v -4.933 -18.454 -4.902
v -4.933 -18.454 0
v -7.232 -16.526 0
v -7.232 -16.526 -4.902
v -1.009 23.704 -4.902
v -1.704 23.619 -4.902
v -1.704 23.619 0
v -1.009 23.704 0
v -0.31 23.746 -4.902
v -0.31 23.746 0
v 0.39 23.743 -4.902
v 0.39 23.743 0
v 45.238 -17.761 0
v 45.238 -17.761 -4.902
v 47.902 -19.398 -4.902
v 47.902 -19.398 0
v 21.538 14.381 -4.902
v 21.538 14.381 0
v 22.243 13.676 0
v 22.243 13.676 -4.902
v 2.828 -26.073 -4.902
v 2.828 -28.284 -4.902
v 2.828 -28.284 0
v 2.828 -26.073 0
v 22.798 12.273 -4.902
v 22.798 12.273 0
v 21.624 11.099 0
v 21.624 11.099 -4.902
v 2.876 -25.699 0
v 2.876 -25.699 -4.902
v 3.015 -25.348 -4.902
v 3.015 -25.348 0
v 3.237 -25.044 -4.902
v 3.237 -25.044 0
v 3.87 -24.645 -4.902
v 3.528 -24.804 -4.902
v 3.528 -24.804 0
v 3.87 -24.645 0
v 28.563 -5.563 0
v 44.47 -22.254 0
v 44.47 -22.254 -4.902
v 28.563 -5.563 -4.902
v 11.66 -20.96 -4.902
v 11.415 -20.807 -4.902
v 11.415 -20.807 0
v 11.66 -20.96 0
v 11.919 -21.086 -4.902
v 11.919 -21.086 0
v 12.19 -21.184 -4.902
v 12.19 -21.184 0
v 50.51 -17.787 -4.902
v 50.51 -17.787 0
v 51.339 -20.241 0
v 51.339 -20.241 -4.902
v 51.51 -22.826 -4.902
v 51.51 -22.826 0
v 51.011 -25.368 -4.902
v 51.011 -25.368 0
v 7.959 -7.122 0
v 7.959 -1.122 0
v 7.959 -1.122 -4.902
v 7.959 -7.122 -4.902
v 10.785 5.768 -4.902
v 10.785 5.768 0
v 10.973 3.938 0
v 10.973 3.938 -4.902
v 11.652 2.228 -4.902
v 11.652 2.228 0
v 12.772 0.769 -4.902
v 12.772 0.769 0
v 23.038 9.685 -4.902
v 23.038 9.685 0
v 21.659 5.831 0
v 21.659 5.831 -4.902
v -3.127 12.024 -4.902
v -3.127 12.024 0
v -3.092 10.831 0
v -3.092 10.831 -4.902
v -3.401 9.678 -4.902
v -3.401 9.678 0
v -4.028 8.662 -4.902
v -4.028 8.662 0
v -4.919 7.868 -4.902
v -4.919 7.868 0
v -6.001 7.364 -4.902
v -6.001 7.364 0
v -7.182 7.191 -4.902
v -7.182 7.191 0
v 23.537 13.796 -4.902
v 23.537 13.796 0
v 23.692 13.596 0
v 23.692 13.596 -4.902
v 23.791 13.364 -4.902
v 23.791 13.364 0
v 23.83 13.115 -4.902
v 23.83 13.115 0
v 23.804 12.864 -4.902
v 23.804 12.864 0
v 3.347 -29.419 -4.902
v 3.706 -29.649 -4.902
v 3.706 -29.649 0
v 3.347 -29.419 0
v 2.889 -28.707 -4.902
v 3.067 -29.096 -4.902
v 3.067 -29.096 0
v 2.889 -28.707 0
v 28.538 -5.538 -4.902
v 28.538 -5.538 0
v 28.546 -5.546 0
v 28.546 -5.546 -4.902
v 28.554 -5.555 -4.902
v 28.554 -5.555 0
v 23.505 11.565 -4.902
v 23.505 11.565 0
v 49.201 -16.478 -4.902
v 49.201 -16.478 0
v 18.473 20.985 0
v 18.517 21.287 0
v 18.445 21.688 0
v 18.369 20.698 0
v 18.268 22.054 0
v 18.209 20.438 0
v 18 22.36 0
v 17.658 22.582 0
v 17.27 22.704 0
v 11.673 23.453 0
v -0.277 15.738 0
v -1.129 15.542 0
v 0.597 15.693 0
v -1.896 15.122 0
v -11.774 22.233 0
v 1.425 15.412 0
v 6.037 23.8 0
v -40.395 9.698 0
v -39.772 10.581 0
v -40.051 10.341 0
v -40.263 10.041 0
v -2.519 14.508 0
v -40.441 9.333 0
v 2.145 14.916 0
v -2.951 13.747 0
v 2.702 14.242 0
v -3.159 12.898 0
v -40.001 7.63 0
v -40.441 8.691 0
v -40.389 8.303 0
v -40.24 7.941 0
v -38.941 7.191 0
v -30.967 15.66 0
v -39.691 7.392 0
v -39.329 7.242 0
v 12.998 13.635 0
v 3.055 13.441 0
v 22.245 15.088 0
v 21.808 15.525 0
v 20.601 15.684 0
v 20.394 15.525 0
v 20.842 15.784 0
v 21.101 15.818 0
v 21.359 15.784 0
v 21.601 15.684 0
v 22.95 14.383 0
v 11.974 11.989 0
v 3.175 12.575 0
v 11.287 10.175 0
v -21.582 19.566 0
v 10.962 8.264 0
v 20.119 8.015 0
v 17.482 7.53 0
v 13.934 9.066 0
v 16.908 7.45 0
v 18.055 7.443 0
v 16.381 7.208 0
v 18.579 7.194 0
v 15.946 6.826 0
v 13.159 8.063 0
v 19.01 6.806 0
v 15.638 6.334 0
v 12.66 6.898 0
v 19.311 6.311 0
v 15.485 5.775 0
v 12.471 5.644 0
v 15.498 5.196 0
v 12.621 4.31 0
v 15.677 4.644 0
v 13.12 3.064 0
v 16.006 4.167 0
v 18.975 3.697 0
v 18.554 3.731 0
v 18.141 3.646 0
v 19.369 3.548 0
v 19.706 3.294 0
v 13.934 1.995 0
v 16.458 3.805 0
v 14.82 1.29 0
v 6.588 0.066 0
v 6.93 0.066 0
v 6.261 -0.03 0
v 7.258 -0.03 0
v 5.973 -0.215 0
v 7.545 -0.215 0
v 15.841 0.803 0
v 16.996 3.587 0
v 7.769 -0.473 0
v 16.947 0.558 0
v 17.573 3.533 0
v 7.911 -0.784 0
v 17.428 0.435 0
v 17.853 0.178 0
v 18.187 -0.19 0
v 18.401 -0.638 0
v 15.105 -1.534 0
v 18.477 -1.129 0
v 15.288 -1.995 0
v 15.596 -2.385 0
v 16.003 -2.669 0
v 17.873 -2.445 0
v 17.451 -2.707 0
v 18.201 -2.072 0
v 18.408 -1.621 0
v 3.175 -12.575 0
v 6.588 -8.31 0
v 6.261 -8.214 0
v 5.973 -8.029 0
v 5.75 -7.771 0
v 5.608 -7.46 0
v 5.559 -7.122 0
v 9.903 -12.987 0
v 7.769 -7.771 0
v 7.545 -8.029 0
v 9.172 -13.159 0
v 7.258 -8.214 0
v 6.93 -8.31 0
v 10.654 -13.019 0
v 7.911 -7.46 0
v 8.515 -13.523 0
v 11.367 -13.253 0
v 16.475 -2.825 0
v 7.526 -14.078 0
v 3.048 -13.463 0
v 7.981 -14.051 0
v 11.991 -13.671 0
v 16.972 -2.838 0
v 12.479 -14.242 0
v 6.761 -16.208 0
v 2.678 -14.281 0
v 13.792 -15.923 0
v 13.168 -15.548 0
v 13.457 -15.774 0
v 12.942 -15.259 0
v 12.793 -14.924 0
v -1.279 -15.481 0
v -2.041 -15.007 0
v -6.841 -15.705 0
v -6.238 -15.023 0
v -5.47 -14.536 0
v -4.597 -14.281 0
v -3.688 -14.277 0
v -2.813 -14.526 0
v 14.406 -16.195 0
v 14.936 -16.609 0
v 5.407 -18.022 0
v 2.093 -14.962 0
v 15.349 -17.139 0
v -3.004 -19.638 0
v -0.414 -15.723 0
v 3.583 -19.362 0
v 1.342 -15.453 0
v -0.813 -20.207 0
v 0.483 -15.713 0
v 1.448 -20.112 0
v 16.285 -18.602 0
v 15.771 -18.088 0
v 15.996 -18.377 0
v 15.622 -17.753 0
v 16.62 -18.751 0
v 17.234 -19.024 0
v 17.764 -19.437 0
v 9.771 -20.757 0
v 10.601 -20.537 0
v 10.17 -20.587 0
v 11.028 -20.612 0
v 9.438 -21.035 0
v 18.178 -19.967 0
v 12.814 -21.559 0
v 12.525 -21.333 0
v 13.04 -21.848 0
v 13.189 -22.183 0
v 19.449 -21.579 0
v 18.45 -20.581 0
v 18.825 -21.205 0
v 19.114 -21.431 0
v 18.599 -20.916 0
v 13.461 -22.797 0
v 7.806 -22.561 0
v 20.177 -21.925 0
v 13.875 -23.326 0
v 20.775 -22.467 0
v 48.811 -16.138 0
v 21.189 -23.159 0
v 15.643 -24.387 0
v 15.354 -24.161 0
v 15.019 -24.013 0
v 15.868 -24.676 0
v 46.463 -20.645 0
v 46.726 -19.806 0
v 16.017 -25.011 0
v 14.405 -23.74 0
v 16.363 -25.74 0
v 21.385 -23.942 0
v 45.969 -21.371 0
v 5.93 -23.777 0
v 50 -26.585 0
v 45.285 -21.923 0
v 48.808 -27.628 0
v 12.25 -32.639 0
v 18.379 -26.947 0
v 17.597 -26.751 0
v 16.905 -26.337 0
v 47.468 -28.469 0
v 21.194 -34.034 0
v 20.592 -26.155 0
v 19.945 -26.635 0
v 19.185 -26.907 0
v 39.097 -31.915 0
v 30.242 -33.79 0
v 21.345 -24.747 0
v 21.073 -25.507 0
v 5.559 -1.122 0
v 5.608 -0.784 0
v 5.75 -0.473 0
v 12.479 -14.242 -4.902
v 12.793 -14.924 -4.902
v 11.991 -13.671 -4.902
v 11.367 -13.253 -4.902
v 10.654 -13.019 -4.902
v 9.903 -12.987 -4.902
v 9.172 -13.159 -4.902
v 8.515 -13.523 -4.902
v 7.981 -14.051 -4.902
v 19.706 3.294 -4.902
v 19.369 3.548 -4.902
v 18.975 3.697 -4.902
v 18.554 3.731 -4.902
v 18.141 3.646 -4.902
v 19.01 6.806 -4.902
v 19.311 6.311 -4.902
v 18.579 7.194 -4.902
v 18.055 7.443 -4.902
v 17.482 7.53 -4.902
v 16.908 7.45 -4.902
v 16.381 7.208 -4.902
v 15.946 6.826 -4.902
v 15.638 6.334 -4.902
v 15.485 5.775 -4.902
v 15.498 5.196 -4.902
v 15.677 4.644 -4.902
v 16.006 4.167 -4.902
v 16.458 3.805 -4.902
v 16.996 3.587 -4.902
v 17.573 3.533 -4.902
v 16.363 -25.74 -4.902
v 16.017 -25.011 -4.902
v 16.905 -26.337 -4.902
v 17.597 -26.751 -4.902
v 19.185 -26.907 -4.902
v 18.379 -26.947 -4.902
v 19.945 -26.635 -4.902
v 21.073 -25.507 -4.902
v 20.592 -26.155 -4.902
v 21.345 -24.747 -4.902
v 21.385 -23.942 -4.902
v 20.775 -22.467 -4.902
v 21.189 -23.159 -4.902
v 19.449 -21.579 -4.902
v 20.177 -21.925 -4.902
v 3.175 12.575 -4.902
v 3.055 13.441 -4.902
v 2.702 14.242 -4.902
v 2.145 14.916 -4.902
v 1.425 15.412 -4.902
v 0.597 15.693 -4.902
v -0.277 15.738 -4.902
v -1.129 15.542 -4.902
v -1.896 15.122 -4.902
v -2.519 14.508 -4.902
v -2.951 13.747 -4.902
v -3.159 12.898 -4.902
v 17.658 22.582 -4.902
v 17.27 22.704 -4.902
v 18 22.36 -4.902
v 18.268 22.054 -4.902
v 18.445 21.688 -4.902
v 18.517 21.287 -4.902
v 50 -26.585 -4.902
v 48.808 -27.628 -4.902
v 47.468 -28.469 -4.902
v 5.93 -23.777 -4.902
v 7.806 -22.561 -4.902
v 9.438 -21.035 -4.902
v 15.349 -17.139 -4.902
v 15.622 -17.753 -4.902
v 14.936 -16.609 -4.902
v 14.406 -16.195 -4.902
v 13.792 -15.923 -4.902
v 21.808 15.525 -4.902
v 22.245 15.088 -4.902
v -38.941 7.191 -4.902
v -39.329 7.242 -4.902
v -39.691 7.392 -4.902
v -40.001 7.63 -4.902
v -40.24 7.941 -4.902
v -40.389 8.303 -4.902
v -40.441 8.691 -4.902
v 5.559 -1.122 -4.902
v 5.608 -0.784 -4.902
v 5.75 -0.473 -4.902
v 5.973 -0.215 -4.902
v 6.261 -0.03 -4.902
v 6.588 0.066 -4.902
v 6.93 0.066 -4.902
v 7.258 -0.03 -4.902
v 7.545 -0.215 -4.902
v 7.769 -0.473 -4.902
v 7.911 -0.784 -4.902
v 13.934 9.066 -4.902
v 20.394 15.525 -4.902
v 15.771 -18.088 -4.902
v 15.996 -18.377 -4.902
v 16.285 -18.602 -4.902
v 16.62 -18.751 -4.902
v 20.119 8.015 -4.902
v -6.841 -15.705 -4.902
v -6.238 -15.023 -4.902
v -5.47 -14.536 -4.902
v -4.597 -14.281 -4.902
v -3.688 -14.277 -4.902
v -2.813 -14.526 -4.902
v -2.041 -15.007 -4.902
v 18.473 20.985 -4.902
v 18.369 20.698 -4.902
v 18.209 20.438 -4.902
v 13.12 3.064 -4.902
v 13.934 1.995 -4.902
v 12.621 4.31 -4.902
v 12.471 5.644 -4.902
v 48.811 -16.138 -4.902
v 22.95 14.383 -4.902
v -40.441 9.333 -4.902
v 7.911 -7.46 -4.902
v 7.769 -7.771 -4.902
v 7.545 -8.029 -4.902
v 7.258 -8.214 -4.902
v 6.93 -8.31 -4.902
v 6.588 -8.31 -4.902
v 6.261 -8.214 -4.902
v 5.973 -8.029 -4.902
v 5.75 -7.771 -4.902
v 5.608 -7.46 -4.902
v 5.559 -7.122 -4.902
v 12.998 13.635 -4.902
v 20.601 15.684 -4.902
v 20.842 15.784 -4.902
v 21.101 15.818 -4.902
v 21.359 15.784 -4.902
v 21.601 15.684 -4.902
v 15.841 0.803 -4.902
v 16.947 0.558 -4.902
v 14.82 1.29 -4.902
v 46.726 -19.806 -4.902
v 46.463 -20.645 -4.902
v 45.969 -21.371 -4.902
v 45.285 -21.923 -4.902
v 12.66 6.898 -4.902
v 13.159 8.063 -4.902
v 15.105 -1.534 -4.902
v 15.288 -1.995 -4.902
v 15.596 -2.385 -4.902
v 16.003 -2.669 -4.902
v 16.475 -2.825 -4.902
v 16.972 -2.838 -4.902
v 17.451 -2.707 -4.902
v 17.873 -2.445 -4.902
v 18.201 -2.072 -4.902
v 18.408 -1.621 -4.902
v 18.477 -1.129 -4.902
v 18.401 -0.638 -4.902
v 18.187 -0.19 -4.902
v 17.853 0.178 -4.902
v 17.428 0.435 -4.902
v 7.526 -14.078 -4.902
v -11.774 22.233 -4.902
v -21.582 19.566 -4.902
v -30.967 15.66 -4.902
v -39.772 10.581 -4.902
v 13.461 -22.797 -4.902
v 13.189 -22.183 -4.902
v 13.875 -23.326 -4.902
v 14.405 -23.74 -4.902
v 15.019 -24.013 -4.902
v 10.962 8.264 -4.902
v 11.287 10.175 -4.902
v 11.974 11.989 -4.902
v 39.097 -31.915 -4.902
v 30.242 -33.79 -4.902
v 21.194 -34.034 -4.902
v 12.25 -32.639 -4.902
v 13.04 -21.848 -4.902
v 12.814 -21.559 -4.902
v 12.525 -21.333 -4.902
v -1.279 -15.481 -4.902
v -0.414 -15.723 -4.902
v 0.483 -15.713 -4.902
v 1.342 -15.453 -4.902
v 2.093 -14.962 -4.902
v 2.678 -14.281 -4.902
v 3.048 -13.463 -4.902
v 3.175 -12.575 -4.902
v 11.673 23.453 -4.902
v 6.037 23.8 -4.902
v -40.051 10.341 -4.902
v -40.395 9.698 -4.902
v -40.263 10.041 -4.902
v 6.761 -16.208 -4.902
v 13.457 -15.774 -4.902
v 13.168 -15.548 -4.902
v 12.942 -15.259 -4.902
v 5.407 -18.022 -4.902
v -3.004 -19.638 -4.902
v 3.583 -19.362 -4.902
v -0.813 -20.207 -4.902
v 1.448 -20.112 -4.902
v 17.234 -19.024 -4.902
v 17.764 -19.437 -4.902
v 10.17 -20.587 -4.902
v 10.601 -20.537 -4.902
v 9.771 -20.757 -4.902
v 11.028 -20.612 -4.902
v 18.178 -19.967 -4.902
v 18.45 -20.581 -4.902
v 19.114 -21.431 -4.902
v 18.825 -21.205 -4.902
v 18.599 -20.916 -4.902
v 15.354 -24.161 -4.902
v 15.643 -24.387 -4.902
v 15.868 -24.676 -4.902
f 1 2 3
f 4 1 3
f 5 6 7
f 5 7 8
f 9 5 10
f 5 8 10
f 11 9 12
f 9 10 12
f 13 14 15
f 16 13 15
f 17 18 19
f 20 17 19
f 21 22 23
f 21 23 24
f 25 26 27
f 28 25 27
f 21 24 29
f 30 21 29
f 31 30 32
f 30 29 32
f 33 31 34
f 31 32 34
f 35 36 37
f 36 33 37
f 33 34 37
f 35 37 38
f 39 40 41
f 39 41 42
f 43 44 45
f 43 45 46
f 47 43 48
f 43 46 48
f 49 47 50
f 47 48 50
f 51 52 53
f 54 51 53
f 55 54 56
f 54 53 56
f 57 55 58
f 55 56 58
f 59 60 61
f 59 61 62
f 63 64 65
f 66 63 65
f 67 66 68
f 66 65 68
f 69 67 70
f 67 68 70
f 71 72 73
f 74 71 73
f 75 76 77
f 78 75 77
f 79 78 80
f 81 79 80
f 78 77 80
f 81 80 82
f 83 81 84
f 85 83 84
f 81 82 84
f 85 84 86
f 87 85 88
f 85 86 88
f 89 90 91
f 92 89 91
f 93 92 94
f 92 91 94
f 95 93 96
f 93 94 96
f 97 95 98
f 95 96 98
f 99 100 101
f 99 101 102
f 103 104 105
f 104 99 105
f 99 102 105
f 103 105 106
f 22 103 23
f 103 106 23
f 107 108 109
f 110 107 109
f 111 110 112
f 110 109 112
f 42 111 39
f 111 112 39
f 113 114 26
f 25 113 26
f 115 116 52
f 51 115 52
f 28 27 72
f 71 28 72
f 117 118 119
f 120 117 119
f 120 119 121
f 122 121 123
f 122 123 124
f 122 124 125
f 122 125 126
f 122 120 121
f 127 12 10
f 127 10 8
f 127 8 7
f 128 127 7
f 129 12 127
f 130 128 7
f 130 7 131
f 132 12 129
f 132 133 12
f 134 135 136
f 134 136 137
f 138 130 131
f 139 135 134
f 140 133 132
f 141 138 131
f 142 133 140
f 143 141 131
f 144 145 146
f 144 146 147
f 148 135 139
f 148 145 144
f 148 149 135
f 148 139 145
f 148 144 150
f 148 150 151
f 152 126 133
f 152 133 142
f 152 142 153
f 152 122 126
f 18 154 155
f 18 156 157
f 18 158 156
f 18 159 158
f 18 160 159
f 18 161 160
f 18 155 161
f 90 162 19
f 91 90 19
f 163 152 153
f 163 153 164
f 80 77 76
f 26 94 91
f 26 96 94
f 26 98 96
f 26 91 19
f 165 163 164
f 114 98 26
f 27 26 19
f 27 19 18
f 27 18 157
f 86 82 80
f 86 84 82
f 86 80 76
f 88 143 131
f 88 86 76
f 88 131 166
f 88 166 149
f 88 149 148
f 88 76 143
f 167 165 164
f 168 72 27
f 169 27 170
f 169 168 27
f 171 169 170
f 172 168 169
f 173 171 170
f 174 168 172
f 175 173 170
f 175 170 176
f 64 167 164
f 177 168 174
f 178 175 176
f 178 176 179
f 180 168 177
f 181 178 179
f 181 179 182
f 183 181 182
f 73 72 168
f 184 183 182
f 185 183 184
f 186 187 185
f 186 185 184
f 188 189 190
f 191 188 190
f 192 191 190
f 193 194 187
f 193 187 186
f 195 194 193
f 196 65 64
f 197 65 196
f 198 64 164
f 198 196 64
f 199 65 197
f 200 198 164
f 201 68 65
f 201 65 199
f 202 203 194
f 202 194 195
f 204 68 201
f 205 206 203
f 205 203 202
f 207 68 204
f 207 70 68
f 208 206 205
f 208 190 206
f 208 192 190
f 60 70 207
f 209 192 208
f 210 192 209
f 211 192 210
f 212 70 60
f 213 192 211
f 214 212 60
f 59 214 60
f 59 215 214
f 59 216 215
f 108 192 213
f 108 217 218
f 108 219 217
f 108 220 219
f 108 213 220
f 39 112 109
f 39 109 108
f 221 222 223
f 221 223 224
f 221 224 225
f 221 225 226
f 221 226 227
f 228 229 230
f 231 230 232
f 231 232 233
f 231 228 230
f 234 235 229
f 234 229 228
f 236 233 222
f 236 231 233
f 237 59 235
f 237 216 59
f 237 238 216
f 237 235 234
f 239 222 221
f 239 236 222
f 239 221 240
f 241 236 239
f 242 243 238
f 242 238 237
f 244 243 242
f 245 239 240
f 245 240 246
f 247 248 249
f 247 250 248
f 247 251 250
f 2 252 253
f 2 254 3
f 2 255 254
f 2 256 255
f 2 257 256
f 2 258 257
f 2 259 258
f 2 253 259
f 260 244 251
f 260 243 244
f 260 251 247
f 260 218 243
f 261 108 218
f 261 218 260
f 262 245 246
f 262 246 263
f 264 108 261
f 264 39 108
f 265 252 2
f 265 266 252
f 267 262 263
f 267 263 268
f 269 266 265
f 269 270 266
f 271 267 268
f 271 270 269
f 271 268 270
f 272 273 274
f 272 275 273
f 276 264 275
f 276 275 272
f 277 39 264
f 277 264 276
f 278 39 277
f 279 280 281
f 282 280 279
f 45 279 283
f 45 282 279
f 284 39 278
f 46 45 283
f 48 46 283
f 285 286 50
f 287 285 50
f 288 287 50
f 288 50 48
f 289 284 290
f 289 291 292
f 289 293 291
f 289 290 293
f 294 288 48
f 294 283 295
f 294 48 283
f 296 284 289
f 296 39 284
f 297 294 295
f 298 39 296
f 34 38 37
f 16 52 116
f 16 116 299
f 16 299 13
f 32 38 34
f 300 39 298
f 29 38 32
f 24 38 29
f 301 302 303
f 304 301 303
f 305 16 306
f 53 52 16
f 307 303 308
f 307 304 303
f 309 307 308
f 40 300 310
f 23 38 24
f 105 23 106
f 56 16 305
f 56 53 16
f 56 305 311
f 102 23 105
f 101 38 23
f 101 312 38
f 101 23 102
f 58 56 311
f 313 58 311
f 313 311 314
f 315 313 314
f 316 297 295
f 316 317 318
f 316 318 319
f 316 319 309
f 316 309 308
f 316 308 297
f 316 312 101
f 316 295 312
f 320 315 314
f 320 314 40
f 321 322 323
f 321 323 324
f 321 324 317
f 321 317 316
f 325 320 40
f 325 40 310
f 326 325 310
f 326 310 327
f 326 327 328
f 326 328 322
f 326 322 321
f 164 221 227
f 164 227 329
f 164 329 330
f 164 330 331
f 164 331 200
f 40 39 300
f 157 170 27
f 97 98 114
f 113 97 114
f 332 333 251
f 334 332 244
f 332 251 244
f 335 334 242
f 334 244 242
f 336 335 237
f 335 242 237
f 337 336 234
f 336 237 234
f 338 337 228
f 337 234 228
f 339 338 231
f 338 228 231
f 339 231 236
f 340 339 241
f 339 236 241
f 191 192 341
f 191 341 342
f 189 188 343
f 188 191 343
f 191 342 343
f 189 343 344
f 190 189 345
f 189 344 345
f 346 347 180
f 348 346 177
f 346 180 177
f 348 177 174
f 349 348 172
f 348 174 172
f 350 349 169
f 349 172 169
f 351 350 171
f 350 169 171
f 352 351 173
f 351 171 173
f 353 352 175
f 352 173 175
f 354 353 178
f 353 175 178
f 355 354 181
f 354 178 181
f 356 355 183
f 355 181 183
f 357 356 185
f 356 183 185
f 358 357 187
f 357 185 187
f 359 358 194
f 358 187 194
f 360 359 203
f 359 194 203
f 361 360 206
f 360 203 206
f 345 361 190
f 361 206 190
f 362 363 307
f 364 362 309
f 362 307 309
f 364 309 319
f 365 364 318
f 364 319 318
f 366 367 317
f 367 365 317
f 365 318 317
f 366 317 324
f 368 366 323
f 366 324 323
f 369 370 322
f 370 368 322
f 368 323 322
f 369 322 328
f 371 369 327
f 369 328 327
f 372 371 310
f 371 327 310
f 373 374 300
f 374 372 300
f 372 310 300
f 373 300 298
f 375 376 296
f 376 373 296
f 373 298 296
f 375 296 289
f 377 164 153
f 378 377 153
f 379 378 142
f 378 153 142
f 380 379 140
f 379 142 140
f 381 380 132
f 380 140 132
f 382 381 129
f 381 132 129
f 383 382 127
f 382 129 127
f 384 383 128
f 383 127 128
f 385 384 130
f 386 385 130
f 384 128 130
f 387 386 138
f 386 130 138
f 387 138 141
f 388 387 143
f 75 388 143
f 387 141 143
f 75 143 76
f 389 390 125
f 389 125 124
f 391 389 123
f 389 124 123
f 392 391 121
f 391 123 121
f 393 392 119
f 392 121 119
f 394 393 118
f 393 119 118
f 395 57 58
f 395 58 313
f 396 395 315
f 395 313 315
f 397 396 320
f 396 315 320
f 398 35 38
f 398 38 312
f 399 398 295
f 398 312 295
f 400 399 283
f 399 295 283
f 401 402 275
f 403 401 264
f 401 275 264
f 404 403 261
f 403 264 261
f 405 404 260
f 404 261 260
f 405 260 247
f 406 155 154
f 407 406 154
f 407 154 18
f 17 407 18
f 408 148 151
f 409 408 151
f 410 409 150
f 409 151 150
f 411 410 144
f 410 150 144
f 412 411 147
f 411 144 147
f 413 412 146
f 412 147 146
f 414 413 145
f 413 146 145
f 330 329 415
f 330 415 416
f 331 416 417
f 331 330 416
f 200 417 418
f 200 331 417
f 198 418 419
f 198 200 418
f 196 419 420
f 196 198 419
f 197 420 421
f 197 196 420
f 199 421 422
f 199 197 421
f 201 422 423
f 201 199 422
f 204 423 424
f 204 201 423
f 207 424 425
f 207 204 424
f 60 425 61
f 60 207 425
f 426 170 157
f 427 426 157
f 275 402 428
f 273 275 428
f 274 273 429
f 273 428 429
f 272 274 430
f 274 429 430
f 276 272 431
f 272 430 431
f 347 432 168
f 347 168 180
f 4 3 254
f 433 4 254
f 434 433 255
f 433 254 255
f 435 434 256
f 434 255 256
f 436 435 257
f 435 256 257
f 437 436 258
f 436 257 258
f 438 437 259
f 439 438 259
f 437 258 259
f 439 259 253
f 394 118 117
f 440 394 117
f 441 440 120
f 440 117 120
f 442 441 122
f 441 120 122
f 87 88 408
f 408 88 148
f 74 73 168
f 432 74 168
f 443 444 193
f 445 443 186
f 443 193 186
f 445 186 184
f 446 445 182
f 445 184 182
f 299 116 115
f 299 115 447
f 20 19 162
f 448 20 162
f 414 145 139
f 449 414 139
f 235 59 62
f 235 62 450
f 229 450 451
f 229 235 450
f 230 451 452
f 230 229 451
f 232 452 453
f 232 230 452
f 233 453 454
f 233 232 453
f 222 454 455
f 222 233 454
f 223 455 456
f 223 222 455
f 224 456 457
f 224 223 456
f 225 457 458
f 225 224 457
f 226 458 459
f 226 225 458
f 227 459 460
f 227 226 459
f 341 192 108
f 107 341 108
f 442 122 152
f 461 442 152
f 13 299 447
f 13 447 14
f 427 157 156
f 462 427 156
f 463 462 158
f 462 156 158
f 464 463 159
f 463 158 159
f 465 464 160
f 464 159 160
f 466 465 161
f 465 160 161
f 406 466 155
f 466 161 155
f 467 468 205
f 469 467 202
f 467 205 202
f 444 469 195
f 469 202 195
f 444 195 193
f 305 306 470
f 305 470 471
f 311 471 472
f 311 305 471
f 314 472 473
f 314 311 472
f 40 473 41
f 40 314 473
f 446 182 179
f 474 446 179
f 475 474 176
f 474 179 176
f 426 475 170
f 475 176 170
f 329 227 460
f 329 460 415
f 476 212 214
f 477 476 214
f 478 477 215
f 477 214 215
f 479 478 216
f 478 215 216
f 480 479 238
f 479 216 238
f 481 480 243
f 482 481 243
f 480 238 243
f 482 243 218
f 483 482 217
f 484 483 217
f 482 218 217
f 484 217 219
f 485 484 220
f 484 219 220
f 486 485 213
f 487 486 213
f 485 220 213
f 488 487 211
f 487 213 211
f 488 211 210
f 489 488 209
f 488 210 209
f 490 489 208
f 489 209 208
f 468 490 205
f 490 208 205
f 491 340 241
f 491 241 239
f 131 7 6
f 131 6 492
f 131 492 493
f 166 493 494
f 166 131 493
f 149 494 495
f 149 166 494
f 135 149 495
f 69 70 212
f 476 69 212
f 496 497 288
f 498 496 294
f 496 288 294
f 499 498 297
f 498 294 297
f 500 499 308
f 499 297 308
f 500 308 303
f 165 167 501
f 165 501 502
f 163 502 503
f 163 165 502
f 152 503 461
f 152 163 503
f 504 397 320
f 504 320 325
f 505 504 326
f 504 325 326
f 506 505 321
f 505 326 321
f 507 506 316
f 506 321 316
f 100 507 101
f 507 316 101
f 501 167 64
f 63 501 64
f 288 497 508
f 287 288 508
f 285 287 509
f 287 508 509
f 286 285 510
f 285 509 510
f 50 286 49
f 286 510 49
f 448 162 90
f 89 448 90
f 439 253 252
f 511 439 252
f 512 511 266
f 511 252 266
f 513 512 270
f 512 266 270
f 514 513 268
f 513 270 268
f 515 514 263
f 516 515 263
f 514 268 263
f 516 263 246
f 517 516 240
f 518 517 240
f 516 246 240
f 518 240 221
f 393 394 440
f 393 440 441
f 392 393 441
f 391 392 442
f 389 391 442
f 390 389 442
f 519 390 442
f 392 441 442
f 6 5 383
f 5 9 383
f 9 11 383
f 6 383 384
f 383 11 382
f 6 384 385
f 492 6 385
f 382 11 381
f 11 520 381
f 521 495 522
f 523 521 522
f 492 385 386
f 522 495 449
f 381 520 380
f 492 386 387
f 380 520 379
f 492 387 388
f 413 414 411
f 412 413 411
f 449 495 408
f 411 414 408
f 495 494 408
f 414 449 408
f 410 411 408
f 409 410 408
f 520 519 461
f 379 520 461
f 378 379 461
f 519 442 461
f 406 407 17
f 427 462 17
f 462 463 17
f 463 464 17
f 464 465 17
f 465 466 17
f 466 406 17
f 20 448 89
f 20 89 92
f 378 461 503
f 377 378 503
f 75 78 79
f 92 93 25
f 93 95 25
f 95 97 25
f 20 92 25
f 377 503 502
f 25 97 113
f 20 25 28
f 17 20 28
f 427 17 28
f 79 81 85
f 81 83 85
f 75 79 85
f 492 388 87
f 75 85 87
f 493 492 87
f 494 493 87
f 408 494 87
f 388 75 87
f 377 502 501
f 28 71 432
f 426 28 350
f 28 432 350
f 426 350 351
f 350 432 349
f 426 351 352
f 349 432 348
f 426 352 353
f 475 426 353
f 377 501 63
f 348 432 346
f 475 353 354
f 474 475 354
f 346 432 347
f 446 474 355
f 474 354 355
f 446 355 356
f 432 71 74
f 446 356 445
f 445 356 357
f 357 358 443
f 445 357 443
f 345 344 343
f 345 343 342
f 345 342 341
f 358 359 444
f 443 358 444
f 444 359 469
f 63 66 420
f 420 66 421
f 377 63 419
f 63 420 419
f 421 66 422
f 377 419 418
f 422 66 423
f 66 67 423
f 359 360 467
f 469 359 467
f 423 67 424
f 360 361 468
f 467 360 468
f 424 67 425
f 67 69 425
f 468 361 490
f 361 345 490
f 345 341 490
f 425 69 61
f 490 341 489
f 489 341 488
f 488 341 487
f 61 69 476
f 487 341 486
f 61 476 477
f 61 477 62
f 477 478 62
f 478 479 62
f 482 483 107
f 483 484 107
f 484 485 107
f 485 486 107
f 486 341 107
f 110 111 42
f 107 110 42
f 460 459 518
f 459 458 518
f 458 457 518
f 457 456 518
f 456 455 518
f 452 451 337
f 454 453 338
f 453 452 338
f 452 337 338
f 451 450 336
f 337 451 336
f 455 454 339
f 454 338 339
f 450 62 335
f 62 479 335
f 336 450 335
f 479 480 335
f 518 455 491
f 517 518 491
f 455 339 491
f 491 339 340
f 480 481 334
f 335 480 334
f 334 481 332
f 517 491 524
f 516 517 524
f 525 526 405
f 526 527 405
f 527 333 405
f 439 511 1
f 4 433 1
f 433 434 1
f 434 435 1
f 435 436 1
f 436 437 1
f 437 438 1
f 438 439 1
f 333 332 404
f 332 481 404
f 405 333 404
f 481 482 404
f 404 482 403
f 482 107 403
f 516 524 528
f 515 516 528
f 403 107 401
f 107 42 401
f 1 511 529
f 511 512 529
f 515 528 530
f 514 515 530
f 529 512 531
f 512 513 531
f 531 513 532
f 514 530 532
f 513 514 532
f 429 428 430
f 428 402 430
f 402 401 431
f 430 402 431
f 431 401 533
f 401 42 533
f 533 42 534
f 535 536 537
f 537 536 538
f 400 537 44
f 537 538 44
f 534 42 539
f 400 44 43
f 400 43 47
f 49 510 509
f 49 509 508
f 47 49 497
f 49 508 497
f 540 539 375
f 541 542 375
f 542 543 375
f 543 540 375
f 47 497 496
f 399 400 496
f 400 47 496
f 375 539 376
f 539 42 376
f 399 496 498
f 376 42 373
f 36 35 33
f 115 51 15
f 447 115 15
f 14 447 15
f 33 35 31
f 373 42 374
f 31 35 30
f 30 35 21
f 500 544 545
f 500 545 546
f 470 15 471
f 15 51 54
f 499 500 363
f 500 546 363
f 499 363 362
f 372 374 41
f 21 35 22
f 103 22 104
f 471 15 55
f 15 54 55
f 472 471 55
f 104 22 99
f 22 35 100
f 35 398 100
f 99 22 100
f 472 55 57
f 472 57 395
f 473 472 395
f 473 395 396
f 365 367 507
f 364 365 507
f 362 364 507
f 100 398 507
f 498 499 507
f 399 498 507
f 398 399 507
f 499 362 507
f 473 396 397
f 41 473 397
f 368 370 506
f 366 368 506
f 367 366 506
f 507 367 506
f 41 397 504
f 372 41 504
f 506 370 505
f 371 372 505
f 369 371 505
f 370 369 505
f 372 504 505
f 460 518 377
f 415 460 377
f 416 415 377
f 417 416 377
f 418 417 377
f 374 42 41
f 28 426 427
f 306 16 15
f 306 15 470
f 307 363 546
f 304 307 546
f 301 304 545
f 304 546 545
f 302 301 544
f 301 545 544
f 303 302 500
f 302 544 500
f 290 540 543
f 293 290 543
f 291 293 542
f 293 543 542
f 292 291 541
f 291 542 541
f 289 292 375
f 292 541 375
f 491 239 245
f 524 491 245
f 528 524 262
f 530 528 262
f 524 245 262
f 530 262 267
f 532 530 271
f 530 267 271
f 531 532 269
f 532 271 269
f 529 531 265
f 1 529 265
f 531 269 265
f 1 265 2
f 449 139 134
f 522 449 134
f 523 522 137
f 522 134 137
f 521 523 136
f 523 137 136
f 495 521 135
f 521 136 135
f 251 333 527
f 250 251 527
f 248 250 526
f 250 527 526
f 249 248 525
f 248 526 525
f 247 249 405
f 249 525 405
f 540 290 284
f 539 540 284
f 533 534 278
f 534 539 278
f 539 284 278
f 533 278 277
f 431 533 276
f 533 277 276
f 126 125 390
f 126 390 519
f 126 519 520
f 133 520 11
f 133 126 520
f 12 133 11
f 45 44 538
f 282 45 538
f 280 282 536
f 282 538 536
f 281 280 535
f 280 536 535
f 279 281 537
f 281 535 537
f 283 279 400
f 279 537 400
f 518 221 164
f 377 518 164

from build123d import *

# Parameters (mm, degrees)
CART_CLIP_DEPTH                    = 4.9022
DEVICE_CLIP_DEPTH                  = 4.9022
JOINT_DEPTH                        = 4.9022
JOINT_FILLETS_R                    = 1
DEVICE_CLIP_FLEX_RELIEF_GEOMETRY_R = 2
DEVICE_CLIP_FLEX_RELIEF_DEPTH      = 62.785838519
SNAP_IN_RELIEF_DEPTH               = 6.35
BOTTOM_BEEFUP_DEPTH                = 4.9022
CABLE_HOLE_R                       = 2.75
CABLE_HOLE_CUT_DEPTH               = 6.35
SHELF_TAIL_DEPTH                   = 4.9022
FRONT_TAB_BEEF_DEPTH               = 4.9022
TOP_CURVE_EXTRUSION_DEPTH          = 4.9022
LPATTERN1_COUNT                    = 4
LPATTERN1_PITCH                    = 4
POSCON_BOTTOM_SNAPBEEF_DEPTH       = 4.9022
POSCON_TOP_CLIP_FLEX_RELIEF_DEPTH  = 6.35
ZIP_TIE_SLOT_DEPTH                 = 6.35
POSCON_BOTTOM_SNAP_RELIEF_DEPTH    = 6.35
SMALL_FILLET_R                     = 1.5
POSCON_TOP_SNAP_RELIEF_DEPTH       = 6.35
LARGE_FILLET_R                     = 10


with BuildPart() as part:
    # Cart Clip Geometry → Cart Clip (new body)
    with BuildSketch(Plane.XY):
        with BuildLine():
            Line((11.175, 4.575), (7.675, -8.575))
            Line((7.675, -8.575), (7.675, -12.575))
            ThreePointArc((7.675, -12.575), (3.243595159, -19.530912266), (-4.933394904, -18.454391101))
            Line((-4.933394904, -18.454391101), (-7.231528234, -16.526028272))
            ThreePointArc((-7.231528234, -16.526028272), (-5.042617938, -14.377626523), (-2.040850661, -15.007191107))
            ThreePointArc((-2.040850661, -15.007191107), (1.341812981, -15.452527224), (3.175, -12.575))
            Line((3.175, -12.575), (3.175, 12.575))
            ThreePointArc((3.175, 12.575), (-0.276719483, 15.737918166), (-3.126764616, 12.023667036))
            ThreePointArc((-3.126764616, 12.023667036), (-5.791346514, 7.43274359), (-10.766819067, 9.282405083))
            Line((-10.766819067, 9.282405083), (-11.00522664, 10.634481615))
            ThreePointArc((-11.00522664, 10.634481615), (-0.973965425, 23.707475751), (11.175, 12.575))
            Line((11.175, 12.575), (11.175, 4.575))
        make_face()
    extrude(amount=-CART_CLIP_DEPTH)



with BuildPart() as body_2:
    # Device Clip Geometry → Device Clip (new body)
    with BuildSketch(Plane.XY):
        with BuildLine():
            Line((22.245178849, 15.087875605), (21.538072068, 14.380768824))
            Line((21.538072068, 14.380768824), (22.243106562, 13.67573433))
            Line((22.243106562, 13.67573433), (22.950213344, 14.382841111))
            Line((22.950213344, 14.382841111), (23.537178094, 13.79587636))
            ThreePointArc((23.537178094, 13.79587636), (23.791320059, 13.364452092), (23.804462509, 12.863910072))
            Line((23.804462509, 12.863910072), (23.504826292, 11.565486463))
            Line((23.504826292, 11.565486463), (22.79771951, 12.272593245))
            Line((22.79771951, 12.272593245), (21.623922254, 11.098795988))
            Line((21.623922254, 11.098795988), (23.038135816, 9.684582425))
            Line((23.038135816, 9.684582425), (21.659277593, 5.830850468))
            Line((21.659277593, 5.830850468), (20.24506403, 7.24506403))
            Line((20.24506403, 7.24506403), (18, 5))
            Line((18, 5), (44.516504294, -21.516504294))
            Line((44.516504294, -21.516504294), (46.761568325, -19.271440264))
            Line((46.761568325, -19.271440264), (45.347354762, -17.857226702))
            Line((45.347354762, -17.857226702), (49.20108672, -16.478368479))
            Line((49.20108672, -16.478368479), (50.615300282, -17.892582041))
            Line((50.615300282, -17.892582041), (51.789097539, -16.718784784))
            Line((51.789097539, -16.718784784), (51.081990758, -16.011678003))
            Line((51.081990758, -16.011678003), (52.380414367, -15.712041786))
            ThreePointArc((52.380414367, -15.712041786), (52.880956387, -15.725184235), (53.312380655, -15.9793262))
            Line((53.312380655, -15.9793262), (53.899345406, -16.566290951))
            Line((53.899345406, -16.566290951), (53.192238624, -17.273397732))
            Line((53.192238624, -17.273397732), (53.897273119, -17.978432226))
            Line((53.897273119, -17.978432226), (54.6043799, -17.271325445))
            Line((54.6043799, -17.271325445), (55.041788732, -17.708734278))
            ThreePointArc((55.041788732, -17.708734278), (55.334681951, -18.415841059), (55.041788732, -19.12294784))
            Line((55.041788732, -19.12294784), (48.582368286, -25.582368286))
            ThreePointArc((48.582368286, -25.582368286), (45.04683438, -27.04683438), (41.511300474, -25.582368286))
            Line((41.511300474, -25.582368286), (13.934136008, 1.99479618))
            ThreePointArc((13.934136008, 1.99479618), (12.469669914, 5.530330086), (13.934136008, 9.065863992))
            Line((13.934136008, 9.065863992), (20.393556454, 15.525284438))
            ThreePointArc((20.393556454, 15.525284438), (21.100663236, 15.818177657), (21.807770017, 15.525284438))
            Line((21.807770017, 15.525284438), (22.245178849, 15.087875605))
        make_face()
    extrude(amount=-DEVICE_CLIP_DEPTH)


with BuildPart() as part_1:
    add(part.part)

    add(body_2.part)  # Joint merges body 2
    # Joint Geometry → Joint (add)
    with BuildSketch(Plane.XY):
        Polygon((7.675, -8.575), (41.511300474, -25.582368286), (13.934136008, 1.99479618), (11.175, 4.575), align=None)
    extrude(amount=-JOINT_DEPTH)

    # joint fillets
    # the kernel refuses this fillet: 1 mm, written as the material it adds along each edge
    with BuildSketch(Plane(origin=(7.675, -8.575, 0), x_dir=(0.8934828469815188, -0.4490973192413867, 0), z_dir=(0, 0, -1))) as joint_fillets_piece_1:
        with BuildLine():
            CenterArc((JOINT_FILLETS_R * 1.62185242183, JOINT_FILLETS_R), JOINT_FILLETS_R, 153.314216372, 116.685783628)
            Line((JOINT_FILLETS_R * 0.728369574849, JOINT_FILLETS_R * 1.44909731924), (0, 0))
            Line((0, 0), (JOINT_FILLETS_R * 1.62185242183, 0))
        make_face()
    extrude(amount=4.9022)
    with BuildSketch(Plane(origin=(41.511300474, -25.582368286, 0), x_dir=(-0.8934828469815294, 0.44909731924136564, 0), z_dir=(0, 0, -1))) as joint_fillets_piece_2:
        with BuildLine():
            CenterArc((0.153680417, -1), JOINT_FILLETS_R, 90, 16.706554242)
            ThreePointArc((-0.133789669, -0.042210383), (-0.066746785, -0.02157445), (0, 0))
            Line((0, 0), (0.153680417, 0))
        make_face()
    extrude(amount=4.9022)
    with BuildSketch(Plane(origin=(13.934136008, 1.99479618, 0), x_dir=(-0.7303933527208794, 0.6830267566509771, 0), z_dir=(0, 0, -1))) as joint_fillets_piece_3:
        with BuildLine():
            CenterArc((4.307177284, 1), JOINT_FILLETS_R, 138.225615508, 131.774384492)
            ThreePointArc((3.561403369, 1.66619912), (1.95135729, 0.468333164), (0, 0))
            Line((0, 0), (4.307177284, 0))
        make_face()
    extrude(amount=4.9022)
    with BuildSketch(Plane(origin=(11.175, 4.575, 0), x_dir=(0, 1, 0), z_dir=(0, 0, -1))) as joint_fillets_piece_4:
        with BuildLine():
            CenterArc((JOINT_FILLETS_R * 0.43397607901, JOINT_FILLETS_R), JOINT_FILLETS_R, 223.080619659, 46.919380341)
            Line((-JOINT_FILLETS_R * 0.296417273711, JOINT_FILLETS_R * 0.316973243349), (0, 0))
            Line((0, 0), (JOINT_FILLETS_R * 0.43397607901, 0))
        make_face()
    extrude(amount=4.9022)

    # Device Clip Flex Relief Geometry → Device Clip Flex Relief (cut, through all)
    with BuildSketch(Plane.XY):
        with Locations((17.469669914, 5.530330086)):
            Circle(DEVICE_CLIP_FLEX_RELIEF_GEOMETRY_R)
    extrude(amount=-DEVICE_CLIP_FLEX_RELIEF_DEPTH, mode=Mode.SUBTRACT)

    # Sketch5 → SNAP IN RELIEF (cut)
    with BuildSketch(Plane.XY):
        with BuildLine():
            Line((44.470063399, -22.25362726), (28.550321446, -5.550321446))
            Line((28.550321446, -5.550321446), (46.761568325, -19.271440264))
            ThreePointArc((46.761568325, -19.271440264), (46.141143244, -21.16619399), (44.470063399, -22.25362726))
        make_face()
    extrude(amount=-SNAP_IN_RELIEF_DEPTH, mode=Mode.SUBTRACT)

    # BOTTOM BEEFUP SKETCH → BOTTOM BEEFUP (add)
    with BuildSketch(Plane.XY):
        with BuildLine():
            Line((10.677043667, -13.889484035), (7.526361766, -14.078164518))
            Line((7.526361766, -14.078164518), (7.208614318, -8.772257329))
            Line((7.208614318, -8.772257329), (10.675, -9.282514389))
            Line((10.675, -9.282514389), (44.278748713, -25.488746112))
            Line((44.278748713, -25.488746112), (53.899345406, -16.566290951))
            Line((53.899345406, -16.566290951), (55.041788732, -17.708734278))
            ThreePointArc((55.041788732, -17.708734278), (55.966427661, -19.737585883), (55.333281386, -21.875416975))
            Line((55.333281386, -21.875416975), (50.398436239, -26.810262122))
            ThreePointArc((50.398436239, -26.810262122), (26.922067406, -34.071170743), (2.828292768, -29.238913377))
            Line((2.828292768, -29.238913377), (2.828292768, -24.930419257))
            ThreePointArc((2.828292768, -24.930419257), (8.371790669, -22.091761318), (11.894021473, -16.955397036))
            Line((11.894021473, -16.955397036), (10.677043667, -13.889484035))
        make_face()
    extrude(amount=-BOTTOM_BEEFUP_DEPTH)

    # CABLE HOLE → CABLE HOLE CUT (cut)
    with BuildSketch(Plane.XY):
        with Locations((10.162604388, -15.724968902)):
            Circle(CABLE_HOLE_R)
    cable_hole_cut = extrude(amount=-CABLE_HOLE_CUT_DEPTH, mode=Mode.SUBTRACT)

    # BOX SLIDE BEEF → SHELF TAIL (add)
    with BuildSketch(Plane.XY):
        Polygon((-7.182015159, 7.190807632), (-40.440555285, 7.190807632), (-40.440555285, 10.131018627), (-4.155347731, 22.948702822), align=None)
    extrude(amount=-SHELF_TAIL_DEPTH)

    # BEHIND TOP CLIP BEEF SKETCH → FRONT TAB BEEF (add)
    with BuildSketch(Plane.XY):
        Polygon((18.518382836, 20.841188896), (11.175, 11.254753066), (0.590090247, 23.734409415), (18.518382836, 22.48088631), align=None)
    extrude(amount=-FRONT_TAB_BEEF_DEPTH)

    # TOP CURVE → TOP CURVE EXTRUSION (add)
    with BuildSketch(Plane.XY):
        with BuildLine():
            Line((-40.440555285, 10.131018627), (-38.751141722, 8.751938886))
            Line((-38.751141722, 8.751938886), (0, 16.86846238))
            Line((0, 16.86846238), (13.175622622, 16.86846238))
            Line((13.175622622, 16.86846238), (18.518382836, 22.48088631))
            ThreePointArc((18.518382836, 22.48088631), (-12.184902527, 22.148517873), (-40.440555285, 10.131018627))
        make_face()
    extrude(amount=-TOP_CURVE_EXTRUSION_DEPTH)

    # LPattern1: CABLE HOLE CUT ×4
    with Locations(*[Vector(0.7071067811865482, -0.7071067811865469, 0) * (i * LPATTERN1_PITCH) for i in range(1, LPATTERN1_COUNT)]):
        add(cable_hole_cut, mode=Mode.SUBTRACT)

    # Sketch13 → POSCON BOTTOM SNAPBEEF (add)
    with BuildSketch(Plane.XY):
        Polygon((49.20108672, -16.478368479), (48.811303545, -16.138109098), (45.23751859, -17.761345734), (45.347354762, -17.857226702), align=None)
    extrude(amount=-POSCON_BOTTOM_SNAPBEEF_DEPTH)

    # Sketch14 → POSCON TOP CLIP FLEX RELIEF (cut)
    with BuildSketch(Plane.XY):
        with BuildLine():
            Line((12.771743003, 0.768531527), (15.105169217, -1.533595637))
            ThreePointArc((15.105169217, -1.533595637), (18.050301611, -2.270498232), (16.94674386, 0.557750439))
            ThreePointArc((16.94674386, 0.557750439), (15.316695608, 1.017603456), (13.933681531, 1.995250716))
            ThreePointArc((13.933681531, 1.995250716), (12.82864211, 3.669991158), (12.470969242, 5.644310734))
            Line((12.470969242, 5.644310734), (11.175, 11.254753066))
            Line((11.175, 11.254753066), (10.784695152, 5.767722626))
            ThreePointArc((10.784695152, 5.767722626), (11.253514306, 3.059570639), (12.771743003, 0.768531527))
        make_face()
    extrude(amount=-POSCON_TOP_CLIP_FLEX_RELIEF_DEPTH, mode=Mode.SUBTRACT)

    # Sketch15 → ZIP TIE SLOT (cut)
    with BuildSketch(Plane.XY):
        with BuildLine():
            Line((7.959147306, -1.122008403), (7.959147306, -7.122008403))
            ThreePointArc((7.959147306, -7.122008403), (6.759147306, -8.322008403), (5.559147306, -7.122008403))
            Line((5.559147306, -7.122008403), (5.559147306, -1.122008403))
            ThreePointArc((5.559147306, -1.122008403), (6.759147306, 0.077991597), (7.959147306, -1.122008403))
        make_face()
    extrude(amount=-ZIP_TIE_SLOT_DEPTH, mode=Mode.SUBTRACT)

    # Sketch16 → POSCON BOTTOM SNAP RELIEF (cut)
    with BuildSketch(Plane.XY):
        Polygon((45.23751859, -17.761345734), (47.901521822, -19.397502687), (45.962169994, -20.070838595), align=None)
        Polygon((41.374346961, -4.041292507), (53.040140925, -21.594507061), (50.398436239, -26.810262122), (52.008012569, -28.207638953), (59.817475223, -20.235408925), align=None)
    extrude(amount=-POSCON_BOTTOM_SNAP_RELIEF_DEPTH, mode=Mode.SUBTRACT)

    # SMALL FILLET
    # the kernel refuses this fillet: 1.5 mm, written as the material it takes off along each edge
    with BuildSketch(Plane(origin=(18.518382836, 20.841188896, 1.271229884), x_dir=(0, 1, 0), z_dir=(0, 0, -1))) as small_fillet_piece_1:
        with BuildLine():
            CenterArc((SMALL_FILLET_R * 0.338994635756, -SMALL_FILLET_R), SMALL_FILLET_R, 90, 37.452766395)
            Line((-SMALL_FILLET_R * 0.269112560318, -SMALL_FILLET_R * 0.206145077434), (0, 0))
            Line((0, 0), (SMALL_FILLET_R * 0.338994635756, 0))
        make_face()
    extrude(amount=7.444659768, mode=Mode.SUBTRACT)
    with BuildSketch(Plane(origin=(-40.440555285, 7.190807632, 3.75), x_dir=(1, 0, 0), z_dir=(0, 0, -1))) as small_fillet_piece_2:
        with BuildLine():
            CenterArc((SMALL_FILLET_R, -SMALL_FILLET_R), SMALL_FILLET_R, 90, 90)
            Line((0, -SMALL_FILLET_R), (0, 0))
            Line((0, 0), (SMALL_FILLET_R, 0))
        make_face()
    extrude(amount=12.4022, mode=Mode.SUBTRACT)
    with BuildSketch(Plane(origin=(12.911452732, -15.804547683, -7.122565694), x_dir=(0.9911354093588505, -0.13285556185220002, 0), z_dir=(0, 0, 1)), Plane(origin=(13.070610293, -21.30224437, -7.122565694), x_dir=(-0.9911354093588505, 0.1328555618522003, 0), z_dir=(0, 0, 1)), Plane(origin=(15.739879856, -18.632974807, -7.122565694), x_dir=(0.9911354093588505, -0.13285556185220002, 0), z_dir=(0, 0, 1)), Plane(origin=(15.899037418, -24.130671495, -7.122565694), x_dir=(-0.9911354093588505, 0.13285556185220002, 0), z_dir=(0, 0, 1)), Plane(origin=(18.568306981, -21.461401932, -7.122565694), x_dir=(0.9911354093588505, -0.1328555618522003, 0), z_dir=(0, 0, 1))) as small_fillet_piece_3:
        with BuildLine():
            CenterArc((1.130367989, 1.480313697), SMALL_FILLET_R, 204.56214871, 56.144973872)
            ThreePointArc((-0.233898388, 0.856793648), (-0.082131714, 0.437901741), (0, 0))
            ThreePointArc((0, 0), (0.444073139, 0.036091555), (0.888146277, 0))
        make_face()
    extrude(amount=9.342931387, mode=Mode.SUBTRACT)
    with BuildSketch(Plane(origin=(28.550321446, -5.550321446, 0.045028607), x_dir=(-0.707106781186794, 0.7071067811863009, 0), z_dir=(0, 0, -1))) as small_fillet_piece_4:
        with BuildLine():
            CenterArc((SMALL_FILLET_R * 0.012007628629, -SMALL_FILLET_R), SMALL_FILLET_R, 90, 1.37590676)
            Line((-SMALL_FILLET_R * 0.0120041665325, -SMALL_FILLET_R * 0.00028832471901), (0, 0))
            Line((0, 0), (SMALL_FILLET_R * 0.0120076286286, 0))
        make_face()
    extrude(amount=4.992257215, mode=Mode.SUBTRACT)
    with BuildSketch(Plane(origin=(18.883883476, 4.116116524, -7.80789415), x_dir=(-0.845154254728517, -0.5345224838248481, 0), z_dir=(0, 0, 1))) as small_fillet_piece_5:
        with BuildLine():
            CenterArc((1.208074074, 1.463368167), SMALL_FILLET_R, 192.688466763, 64.623066475)
            Line((-0.255294092, 1.133893419), (0, 0))
            ThreePointArc((0, 0), (0.439299663, 0.048842445), (0.878599327, 0))
        make_face()
    extrude(amount=10.713588301, mode=Mode.SUBTRACT)
    with BuildSketch(Plane(origin=(18.518382836, 22.48088631, 3.169498478), x_dir=(-0.9844109148420621, 0.17588391268053638, 0), z_dir=(0, 0, -1))) as small_fillet_piece_6:
        with BuildLine():
            CenterArc((1.255758761, -1.499951674), SMALL_FILLET_R, 89.540076871, 80.329822671)
            Line((-0.220857611, -1.236125805), (0, 0))
            ThreePointArc((0, 0), (0.633899696, 0.002544225), (1.267799391, 0))
        make_face()
    extrude(amount=11.241196956, mode=Mode.SUBTRACT)
    with BuildSketch(Plane(origin=(-40.440555285, 10.131018627, 2.0148186), x_dir=(0, -1, 0), z_dir=(0, 0, -1))) as small_fillet_piece_7:
        with BuildLine():
            CenterArc((0.798236635, -1.5), SMALL_FILLET_R, 90, 56.333812142)
            ThreePointArc((-0.450185479, -0.668469949), (-0.225945502, -0.333660676), (0, 0))
            Line((0, 0), (0.798236635, 0))
        make_face()
    extrude(amount=8.931837199, mode=Mode.SUBTRACT)
    with BuildSketch(Plane(origin=(2.828292768, -29.238913377, 2.423362243), x_dir=(0.9059578964296378, -0.4233677950633301, 0), z_dir=(0, 0, -1))) as small_fillet_piece_8:
        with BuildLine():
            CenterArc((0.954766556, -1.499929156), SMALL_FILLET_R, 89.443139617, 65.509466567)
            Line((-0.404170289, -0.864877463), (0, 0))
            ThreePointArc((0, 0), (0.484672449, 0.002355296), (0.969344897, 0))
        make_face()
    extrude(amount=9.748924486, mode=Mode.SUBTRACT)
    with BuildSketch(Plane(origin=(2.828292768, -24.930419257, 2.856498412), x_dir=(0, -1, 0), z_dir=(0, 0, -1))) as small_fillet_piece_9:
        with BuildLine():
            CenterArc((1.142599365, -1.5), SMALL_FILLET_R, 90, 72.220962593)
            ThreePointArc((-0.285762394, -1.041979601), (-0.131773474, -0.524036088), (0, 0))
            Line((0, 0), (1.142599365, 0))
        make_face()
    extrude(amount=10.615196824, mode=Mode.SUBTRACT)
    with BuildSketch(Plane(origin=(10.488001498, -19.692404694, -9.162708984), x_dir=(-0.6158879347432374, -0.7878337717042281, 0), z_dir=(0, 0, 1))) as small_fillet_piece_10:
        with BuildLine():
            CenterArc((1.805044043, 1.496606563), SMALL_FILLET_R, 183.050070351, 83.095200937)
            ThreePointArc((0.307168917, 1.416793616), (0.248625806, 0.687791303), (0, 0))
            ThreePointArc((0, 0), (0.852101797, 0.028674544), (1.704203594, 0))
        make_face()
    extrude(amount=13.423217968, mode=Mode.SUBTRACT)

    # Sketch12 → POSCON TOP SNAP RELIEF (cut)
    with BuildSketch(Plane.XY):
        Polygon((21.659277593, 5.830850468), (20.119072518, 8.015253176), (19.31101106, 6.31101106), align=None)
    extrude(amount=-POSCON_TOP_SNAP_RELIEF_DEPTH, mode=Mode.SUBTRACT)

    # LARGE FILLET
    # the kernel refuses this fillet: 10 mm, written as the material it adds along each edge
    with BuildSketch(Plane(origin=(11.175, 11.254753066, 0), x_dir=(0.6081071960741756, 0.7938549225663365, 0), z_dir=(0, 0, -1))) as large_fillet_piece_1:
        with BuildLine():
            CenterArc((LARGE_FILLET_R * 0.299862584786, LARGE_FILLET_R), LARGE_FILLET_R, 236.615958522, 33.384041478)
            Line((-LARGE_FILLET_R * 0.250385604815, LARGE_FILLET_R * 0.164998844408), (0, 0))
            Line((0, 0), (LARGE_FILLET_R * 0.299862584786, 0))
        make_face()
    extrude(amount=4.9022)
    # the kernel refuses this fillet: 10 mm, written as the material it takes off along each edge
    with BuildSketch(Plane(origin=(50.398436239, -26.810262122, 8.419191937), x_dir=(0.4518362349303937, 0.8921009005734306, 0), z_dir=(0, 0, -1))) as large_fillet_2_piece_1:
        with BuildLine():
            CenterArc((3.011153161, -10), LARGE_FILLET_R, 90, 35.558833916)
            ThreePointArc((-2.804233042, -1.86481203), (-1.417862433, -0.908727914), (0, 0))
            Line((0, 0), (3.011153161, 0))
        make_face()
    extrude(amount=21.740583873, mode=Mode.SUBTRACT)
    with BuildSketch(Plane(origin=(53.040140925, -21.594507061, 14.324954892), x_dir=(-0.5535056363381489, 0.8328454301621045, 0), z_dir=(0, 0, -1))) as large_fillet_2_piece_2:
        with BuildLine():
            CenterArc((5.87668539, -9.914497569), LARGE_FILLET_R, 97.497850744, 52.97155359)
            Line((-2.824240811, -4.985615014), (0, 0))
            Line((0, 0), (4.571795375, 0))
        make_face()
    extrude(amount=33.552109783, mode=Mode.SUBTRACT)


solid = part_1.part
